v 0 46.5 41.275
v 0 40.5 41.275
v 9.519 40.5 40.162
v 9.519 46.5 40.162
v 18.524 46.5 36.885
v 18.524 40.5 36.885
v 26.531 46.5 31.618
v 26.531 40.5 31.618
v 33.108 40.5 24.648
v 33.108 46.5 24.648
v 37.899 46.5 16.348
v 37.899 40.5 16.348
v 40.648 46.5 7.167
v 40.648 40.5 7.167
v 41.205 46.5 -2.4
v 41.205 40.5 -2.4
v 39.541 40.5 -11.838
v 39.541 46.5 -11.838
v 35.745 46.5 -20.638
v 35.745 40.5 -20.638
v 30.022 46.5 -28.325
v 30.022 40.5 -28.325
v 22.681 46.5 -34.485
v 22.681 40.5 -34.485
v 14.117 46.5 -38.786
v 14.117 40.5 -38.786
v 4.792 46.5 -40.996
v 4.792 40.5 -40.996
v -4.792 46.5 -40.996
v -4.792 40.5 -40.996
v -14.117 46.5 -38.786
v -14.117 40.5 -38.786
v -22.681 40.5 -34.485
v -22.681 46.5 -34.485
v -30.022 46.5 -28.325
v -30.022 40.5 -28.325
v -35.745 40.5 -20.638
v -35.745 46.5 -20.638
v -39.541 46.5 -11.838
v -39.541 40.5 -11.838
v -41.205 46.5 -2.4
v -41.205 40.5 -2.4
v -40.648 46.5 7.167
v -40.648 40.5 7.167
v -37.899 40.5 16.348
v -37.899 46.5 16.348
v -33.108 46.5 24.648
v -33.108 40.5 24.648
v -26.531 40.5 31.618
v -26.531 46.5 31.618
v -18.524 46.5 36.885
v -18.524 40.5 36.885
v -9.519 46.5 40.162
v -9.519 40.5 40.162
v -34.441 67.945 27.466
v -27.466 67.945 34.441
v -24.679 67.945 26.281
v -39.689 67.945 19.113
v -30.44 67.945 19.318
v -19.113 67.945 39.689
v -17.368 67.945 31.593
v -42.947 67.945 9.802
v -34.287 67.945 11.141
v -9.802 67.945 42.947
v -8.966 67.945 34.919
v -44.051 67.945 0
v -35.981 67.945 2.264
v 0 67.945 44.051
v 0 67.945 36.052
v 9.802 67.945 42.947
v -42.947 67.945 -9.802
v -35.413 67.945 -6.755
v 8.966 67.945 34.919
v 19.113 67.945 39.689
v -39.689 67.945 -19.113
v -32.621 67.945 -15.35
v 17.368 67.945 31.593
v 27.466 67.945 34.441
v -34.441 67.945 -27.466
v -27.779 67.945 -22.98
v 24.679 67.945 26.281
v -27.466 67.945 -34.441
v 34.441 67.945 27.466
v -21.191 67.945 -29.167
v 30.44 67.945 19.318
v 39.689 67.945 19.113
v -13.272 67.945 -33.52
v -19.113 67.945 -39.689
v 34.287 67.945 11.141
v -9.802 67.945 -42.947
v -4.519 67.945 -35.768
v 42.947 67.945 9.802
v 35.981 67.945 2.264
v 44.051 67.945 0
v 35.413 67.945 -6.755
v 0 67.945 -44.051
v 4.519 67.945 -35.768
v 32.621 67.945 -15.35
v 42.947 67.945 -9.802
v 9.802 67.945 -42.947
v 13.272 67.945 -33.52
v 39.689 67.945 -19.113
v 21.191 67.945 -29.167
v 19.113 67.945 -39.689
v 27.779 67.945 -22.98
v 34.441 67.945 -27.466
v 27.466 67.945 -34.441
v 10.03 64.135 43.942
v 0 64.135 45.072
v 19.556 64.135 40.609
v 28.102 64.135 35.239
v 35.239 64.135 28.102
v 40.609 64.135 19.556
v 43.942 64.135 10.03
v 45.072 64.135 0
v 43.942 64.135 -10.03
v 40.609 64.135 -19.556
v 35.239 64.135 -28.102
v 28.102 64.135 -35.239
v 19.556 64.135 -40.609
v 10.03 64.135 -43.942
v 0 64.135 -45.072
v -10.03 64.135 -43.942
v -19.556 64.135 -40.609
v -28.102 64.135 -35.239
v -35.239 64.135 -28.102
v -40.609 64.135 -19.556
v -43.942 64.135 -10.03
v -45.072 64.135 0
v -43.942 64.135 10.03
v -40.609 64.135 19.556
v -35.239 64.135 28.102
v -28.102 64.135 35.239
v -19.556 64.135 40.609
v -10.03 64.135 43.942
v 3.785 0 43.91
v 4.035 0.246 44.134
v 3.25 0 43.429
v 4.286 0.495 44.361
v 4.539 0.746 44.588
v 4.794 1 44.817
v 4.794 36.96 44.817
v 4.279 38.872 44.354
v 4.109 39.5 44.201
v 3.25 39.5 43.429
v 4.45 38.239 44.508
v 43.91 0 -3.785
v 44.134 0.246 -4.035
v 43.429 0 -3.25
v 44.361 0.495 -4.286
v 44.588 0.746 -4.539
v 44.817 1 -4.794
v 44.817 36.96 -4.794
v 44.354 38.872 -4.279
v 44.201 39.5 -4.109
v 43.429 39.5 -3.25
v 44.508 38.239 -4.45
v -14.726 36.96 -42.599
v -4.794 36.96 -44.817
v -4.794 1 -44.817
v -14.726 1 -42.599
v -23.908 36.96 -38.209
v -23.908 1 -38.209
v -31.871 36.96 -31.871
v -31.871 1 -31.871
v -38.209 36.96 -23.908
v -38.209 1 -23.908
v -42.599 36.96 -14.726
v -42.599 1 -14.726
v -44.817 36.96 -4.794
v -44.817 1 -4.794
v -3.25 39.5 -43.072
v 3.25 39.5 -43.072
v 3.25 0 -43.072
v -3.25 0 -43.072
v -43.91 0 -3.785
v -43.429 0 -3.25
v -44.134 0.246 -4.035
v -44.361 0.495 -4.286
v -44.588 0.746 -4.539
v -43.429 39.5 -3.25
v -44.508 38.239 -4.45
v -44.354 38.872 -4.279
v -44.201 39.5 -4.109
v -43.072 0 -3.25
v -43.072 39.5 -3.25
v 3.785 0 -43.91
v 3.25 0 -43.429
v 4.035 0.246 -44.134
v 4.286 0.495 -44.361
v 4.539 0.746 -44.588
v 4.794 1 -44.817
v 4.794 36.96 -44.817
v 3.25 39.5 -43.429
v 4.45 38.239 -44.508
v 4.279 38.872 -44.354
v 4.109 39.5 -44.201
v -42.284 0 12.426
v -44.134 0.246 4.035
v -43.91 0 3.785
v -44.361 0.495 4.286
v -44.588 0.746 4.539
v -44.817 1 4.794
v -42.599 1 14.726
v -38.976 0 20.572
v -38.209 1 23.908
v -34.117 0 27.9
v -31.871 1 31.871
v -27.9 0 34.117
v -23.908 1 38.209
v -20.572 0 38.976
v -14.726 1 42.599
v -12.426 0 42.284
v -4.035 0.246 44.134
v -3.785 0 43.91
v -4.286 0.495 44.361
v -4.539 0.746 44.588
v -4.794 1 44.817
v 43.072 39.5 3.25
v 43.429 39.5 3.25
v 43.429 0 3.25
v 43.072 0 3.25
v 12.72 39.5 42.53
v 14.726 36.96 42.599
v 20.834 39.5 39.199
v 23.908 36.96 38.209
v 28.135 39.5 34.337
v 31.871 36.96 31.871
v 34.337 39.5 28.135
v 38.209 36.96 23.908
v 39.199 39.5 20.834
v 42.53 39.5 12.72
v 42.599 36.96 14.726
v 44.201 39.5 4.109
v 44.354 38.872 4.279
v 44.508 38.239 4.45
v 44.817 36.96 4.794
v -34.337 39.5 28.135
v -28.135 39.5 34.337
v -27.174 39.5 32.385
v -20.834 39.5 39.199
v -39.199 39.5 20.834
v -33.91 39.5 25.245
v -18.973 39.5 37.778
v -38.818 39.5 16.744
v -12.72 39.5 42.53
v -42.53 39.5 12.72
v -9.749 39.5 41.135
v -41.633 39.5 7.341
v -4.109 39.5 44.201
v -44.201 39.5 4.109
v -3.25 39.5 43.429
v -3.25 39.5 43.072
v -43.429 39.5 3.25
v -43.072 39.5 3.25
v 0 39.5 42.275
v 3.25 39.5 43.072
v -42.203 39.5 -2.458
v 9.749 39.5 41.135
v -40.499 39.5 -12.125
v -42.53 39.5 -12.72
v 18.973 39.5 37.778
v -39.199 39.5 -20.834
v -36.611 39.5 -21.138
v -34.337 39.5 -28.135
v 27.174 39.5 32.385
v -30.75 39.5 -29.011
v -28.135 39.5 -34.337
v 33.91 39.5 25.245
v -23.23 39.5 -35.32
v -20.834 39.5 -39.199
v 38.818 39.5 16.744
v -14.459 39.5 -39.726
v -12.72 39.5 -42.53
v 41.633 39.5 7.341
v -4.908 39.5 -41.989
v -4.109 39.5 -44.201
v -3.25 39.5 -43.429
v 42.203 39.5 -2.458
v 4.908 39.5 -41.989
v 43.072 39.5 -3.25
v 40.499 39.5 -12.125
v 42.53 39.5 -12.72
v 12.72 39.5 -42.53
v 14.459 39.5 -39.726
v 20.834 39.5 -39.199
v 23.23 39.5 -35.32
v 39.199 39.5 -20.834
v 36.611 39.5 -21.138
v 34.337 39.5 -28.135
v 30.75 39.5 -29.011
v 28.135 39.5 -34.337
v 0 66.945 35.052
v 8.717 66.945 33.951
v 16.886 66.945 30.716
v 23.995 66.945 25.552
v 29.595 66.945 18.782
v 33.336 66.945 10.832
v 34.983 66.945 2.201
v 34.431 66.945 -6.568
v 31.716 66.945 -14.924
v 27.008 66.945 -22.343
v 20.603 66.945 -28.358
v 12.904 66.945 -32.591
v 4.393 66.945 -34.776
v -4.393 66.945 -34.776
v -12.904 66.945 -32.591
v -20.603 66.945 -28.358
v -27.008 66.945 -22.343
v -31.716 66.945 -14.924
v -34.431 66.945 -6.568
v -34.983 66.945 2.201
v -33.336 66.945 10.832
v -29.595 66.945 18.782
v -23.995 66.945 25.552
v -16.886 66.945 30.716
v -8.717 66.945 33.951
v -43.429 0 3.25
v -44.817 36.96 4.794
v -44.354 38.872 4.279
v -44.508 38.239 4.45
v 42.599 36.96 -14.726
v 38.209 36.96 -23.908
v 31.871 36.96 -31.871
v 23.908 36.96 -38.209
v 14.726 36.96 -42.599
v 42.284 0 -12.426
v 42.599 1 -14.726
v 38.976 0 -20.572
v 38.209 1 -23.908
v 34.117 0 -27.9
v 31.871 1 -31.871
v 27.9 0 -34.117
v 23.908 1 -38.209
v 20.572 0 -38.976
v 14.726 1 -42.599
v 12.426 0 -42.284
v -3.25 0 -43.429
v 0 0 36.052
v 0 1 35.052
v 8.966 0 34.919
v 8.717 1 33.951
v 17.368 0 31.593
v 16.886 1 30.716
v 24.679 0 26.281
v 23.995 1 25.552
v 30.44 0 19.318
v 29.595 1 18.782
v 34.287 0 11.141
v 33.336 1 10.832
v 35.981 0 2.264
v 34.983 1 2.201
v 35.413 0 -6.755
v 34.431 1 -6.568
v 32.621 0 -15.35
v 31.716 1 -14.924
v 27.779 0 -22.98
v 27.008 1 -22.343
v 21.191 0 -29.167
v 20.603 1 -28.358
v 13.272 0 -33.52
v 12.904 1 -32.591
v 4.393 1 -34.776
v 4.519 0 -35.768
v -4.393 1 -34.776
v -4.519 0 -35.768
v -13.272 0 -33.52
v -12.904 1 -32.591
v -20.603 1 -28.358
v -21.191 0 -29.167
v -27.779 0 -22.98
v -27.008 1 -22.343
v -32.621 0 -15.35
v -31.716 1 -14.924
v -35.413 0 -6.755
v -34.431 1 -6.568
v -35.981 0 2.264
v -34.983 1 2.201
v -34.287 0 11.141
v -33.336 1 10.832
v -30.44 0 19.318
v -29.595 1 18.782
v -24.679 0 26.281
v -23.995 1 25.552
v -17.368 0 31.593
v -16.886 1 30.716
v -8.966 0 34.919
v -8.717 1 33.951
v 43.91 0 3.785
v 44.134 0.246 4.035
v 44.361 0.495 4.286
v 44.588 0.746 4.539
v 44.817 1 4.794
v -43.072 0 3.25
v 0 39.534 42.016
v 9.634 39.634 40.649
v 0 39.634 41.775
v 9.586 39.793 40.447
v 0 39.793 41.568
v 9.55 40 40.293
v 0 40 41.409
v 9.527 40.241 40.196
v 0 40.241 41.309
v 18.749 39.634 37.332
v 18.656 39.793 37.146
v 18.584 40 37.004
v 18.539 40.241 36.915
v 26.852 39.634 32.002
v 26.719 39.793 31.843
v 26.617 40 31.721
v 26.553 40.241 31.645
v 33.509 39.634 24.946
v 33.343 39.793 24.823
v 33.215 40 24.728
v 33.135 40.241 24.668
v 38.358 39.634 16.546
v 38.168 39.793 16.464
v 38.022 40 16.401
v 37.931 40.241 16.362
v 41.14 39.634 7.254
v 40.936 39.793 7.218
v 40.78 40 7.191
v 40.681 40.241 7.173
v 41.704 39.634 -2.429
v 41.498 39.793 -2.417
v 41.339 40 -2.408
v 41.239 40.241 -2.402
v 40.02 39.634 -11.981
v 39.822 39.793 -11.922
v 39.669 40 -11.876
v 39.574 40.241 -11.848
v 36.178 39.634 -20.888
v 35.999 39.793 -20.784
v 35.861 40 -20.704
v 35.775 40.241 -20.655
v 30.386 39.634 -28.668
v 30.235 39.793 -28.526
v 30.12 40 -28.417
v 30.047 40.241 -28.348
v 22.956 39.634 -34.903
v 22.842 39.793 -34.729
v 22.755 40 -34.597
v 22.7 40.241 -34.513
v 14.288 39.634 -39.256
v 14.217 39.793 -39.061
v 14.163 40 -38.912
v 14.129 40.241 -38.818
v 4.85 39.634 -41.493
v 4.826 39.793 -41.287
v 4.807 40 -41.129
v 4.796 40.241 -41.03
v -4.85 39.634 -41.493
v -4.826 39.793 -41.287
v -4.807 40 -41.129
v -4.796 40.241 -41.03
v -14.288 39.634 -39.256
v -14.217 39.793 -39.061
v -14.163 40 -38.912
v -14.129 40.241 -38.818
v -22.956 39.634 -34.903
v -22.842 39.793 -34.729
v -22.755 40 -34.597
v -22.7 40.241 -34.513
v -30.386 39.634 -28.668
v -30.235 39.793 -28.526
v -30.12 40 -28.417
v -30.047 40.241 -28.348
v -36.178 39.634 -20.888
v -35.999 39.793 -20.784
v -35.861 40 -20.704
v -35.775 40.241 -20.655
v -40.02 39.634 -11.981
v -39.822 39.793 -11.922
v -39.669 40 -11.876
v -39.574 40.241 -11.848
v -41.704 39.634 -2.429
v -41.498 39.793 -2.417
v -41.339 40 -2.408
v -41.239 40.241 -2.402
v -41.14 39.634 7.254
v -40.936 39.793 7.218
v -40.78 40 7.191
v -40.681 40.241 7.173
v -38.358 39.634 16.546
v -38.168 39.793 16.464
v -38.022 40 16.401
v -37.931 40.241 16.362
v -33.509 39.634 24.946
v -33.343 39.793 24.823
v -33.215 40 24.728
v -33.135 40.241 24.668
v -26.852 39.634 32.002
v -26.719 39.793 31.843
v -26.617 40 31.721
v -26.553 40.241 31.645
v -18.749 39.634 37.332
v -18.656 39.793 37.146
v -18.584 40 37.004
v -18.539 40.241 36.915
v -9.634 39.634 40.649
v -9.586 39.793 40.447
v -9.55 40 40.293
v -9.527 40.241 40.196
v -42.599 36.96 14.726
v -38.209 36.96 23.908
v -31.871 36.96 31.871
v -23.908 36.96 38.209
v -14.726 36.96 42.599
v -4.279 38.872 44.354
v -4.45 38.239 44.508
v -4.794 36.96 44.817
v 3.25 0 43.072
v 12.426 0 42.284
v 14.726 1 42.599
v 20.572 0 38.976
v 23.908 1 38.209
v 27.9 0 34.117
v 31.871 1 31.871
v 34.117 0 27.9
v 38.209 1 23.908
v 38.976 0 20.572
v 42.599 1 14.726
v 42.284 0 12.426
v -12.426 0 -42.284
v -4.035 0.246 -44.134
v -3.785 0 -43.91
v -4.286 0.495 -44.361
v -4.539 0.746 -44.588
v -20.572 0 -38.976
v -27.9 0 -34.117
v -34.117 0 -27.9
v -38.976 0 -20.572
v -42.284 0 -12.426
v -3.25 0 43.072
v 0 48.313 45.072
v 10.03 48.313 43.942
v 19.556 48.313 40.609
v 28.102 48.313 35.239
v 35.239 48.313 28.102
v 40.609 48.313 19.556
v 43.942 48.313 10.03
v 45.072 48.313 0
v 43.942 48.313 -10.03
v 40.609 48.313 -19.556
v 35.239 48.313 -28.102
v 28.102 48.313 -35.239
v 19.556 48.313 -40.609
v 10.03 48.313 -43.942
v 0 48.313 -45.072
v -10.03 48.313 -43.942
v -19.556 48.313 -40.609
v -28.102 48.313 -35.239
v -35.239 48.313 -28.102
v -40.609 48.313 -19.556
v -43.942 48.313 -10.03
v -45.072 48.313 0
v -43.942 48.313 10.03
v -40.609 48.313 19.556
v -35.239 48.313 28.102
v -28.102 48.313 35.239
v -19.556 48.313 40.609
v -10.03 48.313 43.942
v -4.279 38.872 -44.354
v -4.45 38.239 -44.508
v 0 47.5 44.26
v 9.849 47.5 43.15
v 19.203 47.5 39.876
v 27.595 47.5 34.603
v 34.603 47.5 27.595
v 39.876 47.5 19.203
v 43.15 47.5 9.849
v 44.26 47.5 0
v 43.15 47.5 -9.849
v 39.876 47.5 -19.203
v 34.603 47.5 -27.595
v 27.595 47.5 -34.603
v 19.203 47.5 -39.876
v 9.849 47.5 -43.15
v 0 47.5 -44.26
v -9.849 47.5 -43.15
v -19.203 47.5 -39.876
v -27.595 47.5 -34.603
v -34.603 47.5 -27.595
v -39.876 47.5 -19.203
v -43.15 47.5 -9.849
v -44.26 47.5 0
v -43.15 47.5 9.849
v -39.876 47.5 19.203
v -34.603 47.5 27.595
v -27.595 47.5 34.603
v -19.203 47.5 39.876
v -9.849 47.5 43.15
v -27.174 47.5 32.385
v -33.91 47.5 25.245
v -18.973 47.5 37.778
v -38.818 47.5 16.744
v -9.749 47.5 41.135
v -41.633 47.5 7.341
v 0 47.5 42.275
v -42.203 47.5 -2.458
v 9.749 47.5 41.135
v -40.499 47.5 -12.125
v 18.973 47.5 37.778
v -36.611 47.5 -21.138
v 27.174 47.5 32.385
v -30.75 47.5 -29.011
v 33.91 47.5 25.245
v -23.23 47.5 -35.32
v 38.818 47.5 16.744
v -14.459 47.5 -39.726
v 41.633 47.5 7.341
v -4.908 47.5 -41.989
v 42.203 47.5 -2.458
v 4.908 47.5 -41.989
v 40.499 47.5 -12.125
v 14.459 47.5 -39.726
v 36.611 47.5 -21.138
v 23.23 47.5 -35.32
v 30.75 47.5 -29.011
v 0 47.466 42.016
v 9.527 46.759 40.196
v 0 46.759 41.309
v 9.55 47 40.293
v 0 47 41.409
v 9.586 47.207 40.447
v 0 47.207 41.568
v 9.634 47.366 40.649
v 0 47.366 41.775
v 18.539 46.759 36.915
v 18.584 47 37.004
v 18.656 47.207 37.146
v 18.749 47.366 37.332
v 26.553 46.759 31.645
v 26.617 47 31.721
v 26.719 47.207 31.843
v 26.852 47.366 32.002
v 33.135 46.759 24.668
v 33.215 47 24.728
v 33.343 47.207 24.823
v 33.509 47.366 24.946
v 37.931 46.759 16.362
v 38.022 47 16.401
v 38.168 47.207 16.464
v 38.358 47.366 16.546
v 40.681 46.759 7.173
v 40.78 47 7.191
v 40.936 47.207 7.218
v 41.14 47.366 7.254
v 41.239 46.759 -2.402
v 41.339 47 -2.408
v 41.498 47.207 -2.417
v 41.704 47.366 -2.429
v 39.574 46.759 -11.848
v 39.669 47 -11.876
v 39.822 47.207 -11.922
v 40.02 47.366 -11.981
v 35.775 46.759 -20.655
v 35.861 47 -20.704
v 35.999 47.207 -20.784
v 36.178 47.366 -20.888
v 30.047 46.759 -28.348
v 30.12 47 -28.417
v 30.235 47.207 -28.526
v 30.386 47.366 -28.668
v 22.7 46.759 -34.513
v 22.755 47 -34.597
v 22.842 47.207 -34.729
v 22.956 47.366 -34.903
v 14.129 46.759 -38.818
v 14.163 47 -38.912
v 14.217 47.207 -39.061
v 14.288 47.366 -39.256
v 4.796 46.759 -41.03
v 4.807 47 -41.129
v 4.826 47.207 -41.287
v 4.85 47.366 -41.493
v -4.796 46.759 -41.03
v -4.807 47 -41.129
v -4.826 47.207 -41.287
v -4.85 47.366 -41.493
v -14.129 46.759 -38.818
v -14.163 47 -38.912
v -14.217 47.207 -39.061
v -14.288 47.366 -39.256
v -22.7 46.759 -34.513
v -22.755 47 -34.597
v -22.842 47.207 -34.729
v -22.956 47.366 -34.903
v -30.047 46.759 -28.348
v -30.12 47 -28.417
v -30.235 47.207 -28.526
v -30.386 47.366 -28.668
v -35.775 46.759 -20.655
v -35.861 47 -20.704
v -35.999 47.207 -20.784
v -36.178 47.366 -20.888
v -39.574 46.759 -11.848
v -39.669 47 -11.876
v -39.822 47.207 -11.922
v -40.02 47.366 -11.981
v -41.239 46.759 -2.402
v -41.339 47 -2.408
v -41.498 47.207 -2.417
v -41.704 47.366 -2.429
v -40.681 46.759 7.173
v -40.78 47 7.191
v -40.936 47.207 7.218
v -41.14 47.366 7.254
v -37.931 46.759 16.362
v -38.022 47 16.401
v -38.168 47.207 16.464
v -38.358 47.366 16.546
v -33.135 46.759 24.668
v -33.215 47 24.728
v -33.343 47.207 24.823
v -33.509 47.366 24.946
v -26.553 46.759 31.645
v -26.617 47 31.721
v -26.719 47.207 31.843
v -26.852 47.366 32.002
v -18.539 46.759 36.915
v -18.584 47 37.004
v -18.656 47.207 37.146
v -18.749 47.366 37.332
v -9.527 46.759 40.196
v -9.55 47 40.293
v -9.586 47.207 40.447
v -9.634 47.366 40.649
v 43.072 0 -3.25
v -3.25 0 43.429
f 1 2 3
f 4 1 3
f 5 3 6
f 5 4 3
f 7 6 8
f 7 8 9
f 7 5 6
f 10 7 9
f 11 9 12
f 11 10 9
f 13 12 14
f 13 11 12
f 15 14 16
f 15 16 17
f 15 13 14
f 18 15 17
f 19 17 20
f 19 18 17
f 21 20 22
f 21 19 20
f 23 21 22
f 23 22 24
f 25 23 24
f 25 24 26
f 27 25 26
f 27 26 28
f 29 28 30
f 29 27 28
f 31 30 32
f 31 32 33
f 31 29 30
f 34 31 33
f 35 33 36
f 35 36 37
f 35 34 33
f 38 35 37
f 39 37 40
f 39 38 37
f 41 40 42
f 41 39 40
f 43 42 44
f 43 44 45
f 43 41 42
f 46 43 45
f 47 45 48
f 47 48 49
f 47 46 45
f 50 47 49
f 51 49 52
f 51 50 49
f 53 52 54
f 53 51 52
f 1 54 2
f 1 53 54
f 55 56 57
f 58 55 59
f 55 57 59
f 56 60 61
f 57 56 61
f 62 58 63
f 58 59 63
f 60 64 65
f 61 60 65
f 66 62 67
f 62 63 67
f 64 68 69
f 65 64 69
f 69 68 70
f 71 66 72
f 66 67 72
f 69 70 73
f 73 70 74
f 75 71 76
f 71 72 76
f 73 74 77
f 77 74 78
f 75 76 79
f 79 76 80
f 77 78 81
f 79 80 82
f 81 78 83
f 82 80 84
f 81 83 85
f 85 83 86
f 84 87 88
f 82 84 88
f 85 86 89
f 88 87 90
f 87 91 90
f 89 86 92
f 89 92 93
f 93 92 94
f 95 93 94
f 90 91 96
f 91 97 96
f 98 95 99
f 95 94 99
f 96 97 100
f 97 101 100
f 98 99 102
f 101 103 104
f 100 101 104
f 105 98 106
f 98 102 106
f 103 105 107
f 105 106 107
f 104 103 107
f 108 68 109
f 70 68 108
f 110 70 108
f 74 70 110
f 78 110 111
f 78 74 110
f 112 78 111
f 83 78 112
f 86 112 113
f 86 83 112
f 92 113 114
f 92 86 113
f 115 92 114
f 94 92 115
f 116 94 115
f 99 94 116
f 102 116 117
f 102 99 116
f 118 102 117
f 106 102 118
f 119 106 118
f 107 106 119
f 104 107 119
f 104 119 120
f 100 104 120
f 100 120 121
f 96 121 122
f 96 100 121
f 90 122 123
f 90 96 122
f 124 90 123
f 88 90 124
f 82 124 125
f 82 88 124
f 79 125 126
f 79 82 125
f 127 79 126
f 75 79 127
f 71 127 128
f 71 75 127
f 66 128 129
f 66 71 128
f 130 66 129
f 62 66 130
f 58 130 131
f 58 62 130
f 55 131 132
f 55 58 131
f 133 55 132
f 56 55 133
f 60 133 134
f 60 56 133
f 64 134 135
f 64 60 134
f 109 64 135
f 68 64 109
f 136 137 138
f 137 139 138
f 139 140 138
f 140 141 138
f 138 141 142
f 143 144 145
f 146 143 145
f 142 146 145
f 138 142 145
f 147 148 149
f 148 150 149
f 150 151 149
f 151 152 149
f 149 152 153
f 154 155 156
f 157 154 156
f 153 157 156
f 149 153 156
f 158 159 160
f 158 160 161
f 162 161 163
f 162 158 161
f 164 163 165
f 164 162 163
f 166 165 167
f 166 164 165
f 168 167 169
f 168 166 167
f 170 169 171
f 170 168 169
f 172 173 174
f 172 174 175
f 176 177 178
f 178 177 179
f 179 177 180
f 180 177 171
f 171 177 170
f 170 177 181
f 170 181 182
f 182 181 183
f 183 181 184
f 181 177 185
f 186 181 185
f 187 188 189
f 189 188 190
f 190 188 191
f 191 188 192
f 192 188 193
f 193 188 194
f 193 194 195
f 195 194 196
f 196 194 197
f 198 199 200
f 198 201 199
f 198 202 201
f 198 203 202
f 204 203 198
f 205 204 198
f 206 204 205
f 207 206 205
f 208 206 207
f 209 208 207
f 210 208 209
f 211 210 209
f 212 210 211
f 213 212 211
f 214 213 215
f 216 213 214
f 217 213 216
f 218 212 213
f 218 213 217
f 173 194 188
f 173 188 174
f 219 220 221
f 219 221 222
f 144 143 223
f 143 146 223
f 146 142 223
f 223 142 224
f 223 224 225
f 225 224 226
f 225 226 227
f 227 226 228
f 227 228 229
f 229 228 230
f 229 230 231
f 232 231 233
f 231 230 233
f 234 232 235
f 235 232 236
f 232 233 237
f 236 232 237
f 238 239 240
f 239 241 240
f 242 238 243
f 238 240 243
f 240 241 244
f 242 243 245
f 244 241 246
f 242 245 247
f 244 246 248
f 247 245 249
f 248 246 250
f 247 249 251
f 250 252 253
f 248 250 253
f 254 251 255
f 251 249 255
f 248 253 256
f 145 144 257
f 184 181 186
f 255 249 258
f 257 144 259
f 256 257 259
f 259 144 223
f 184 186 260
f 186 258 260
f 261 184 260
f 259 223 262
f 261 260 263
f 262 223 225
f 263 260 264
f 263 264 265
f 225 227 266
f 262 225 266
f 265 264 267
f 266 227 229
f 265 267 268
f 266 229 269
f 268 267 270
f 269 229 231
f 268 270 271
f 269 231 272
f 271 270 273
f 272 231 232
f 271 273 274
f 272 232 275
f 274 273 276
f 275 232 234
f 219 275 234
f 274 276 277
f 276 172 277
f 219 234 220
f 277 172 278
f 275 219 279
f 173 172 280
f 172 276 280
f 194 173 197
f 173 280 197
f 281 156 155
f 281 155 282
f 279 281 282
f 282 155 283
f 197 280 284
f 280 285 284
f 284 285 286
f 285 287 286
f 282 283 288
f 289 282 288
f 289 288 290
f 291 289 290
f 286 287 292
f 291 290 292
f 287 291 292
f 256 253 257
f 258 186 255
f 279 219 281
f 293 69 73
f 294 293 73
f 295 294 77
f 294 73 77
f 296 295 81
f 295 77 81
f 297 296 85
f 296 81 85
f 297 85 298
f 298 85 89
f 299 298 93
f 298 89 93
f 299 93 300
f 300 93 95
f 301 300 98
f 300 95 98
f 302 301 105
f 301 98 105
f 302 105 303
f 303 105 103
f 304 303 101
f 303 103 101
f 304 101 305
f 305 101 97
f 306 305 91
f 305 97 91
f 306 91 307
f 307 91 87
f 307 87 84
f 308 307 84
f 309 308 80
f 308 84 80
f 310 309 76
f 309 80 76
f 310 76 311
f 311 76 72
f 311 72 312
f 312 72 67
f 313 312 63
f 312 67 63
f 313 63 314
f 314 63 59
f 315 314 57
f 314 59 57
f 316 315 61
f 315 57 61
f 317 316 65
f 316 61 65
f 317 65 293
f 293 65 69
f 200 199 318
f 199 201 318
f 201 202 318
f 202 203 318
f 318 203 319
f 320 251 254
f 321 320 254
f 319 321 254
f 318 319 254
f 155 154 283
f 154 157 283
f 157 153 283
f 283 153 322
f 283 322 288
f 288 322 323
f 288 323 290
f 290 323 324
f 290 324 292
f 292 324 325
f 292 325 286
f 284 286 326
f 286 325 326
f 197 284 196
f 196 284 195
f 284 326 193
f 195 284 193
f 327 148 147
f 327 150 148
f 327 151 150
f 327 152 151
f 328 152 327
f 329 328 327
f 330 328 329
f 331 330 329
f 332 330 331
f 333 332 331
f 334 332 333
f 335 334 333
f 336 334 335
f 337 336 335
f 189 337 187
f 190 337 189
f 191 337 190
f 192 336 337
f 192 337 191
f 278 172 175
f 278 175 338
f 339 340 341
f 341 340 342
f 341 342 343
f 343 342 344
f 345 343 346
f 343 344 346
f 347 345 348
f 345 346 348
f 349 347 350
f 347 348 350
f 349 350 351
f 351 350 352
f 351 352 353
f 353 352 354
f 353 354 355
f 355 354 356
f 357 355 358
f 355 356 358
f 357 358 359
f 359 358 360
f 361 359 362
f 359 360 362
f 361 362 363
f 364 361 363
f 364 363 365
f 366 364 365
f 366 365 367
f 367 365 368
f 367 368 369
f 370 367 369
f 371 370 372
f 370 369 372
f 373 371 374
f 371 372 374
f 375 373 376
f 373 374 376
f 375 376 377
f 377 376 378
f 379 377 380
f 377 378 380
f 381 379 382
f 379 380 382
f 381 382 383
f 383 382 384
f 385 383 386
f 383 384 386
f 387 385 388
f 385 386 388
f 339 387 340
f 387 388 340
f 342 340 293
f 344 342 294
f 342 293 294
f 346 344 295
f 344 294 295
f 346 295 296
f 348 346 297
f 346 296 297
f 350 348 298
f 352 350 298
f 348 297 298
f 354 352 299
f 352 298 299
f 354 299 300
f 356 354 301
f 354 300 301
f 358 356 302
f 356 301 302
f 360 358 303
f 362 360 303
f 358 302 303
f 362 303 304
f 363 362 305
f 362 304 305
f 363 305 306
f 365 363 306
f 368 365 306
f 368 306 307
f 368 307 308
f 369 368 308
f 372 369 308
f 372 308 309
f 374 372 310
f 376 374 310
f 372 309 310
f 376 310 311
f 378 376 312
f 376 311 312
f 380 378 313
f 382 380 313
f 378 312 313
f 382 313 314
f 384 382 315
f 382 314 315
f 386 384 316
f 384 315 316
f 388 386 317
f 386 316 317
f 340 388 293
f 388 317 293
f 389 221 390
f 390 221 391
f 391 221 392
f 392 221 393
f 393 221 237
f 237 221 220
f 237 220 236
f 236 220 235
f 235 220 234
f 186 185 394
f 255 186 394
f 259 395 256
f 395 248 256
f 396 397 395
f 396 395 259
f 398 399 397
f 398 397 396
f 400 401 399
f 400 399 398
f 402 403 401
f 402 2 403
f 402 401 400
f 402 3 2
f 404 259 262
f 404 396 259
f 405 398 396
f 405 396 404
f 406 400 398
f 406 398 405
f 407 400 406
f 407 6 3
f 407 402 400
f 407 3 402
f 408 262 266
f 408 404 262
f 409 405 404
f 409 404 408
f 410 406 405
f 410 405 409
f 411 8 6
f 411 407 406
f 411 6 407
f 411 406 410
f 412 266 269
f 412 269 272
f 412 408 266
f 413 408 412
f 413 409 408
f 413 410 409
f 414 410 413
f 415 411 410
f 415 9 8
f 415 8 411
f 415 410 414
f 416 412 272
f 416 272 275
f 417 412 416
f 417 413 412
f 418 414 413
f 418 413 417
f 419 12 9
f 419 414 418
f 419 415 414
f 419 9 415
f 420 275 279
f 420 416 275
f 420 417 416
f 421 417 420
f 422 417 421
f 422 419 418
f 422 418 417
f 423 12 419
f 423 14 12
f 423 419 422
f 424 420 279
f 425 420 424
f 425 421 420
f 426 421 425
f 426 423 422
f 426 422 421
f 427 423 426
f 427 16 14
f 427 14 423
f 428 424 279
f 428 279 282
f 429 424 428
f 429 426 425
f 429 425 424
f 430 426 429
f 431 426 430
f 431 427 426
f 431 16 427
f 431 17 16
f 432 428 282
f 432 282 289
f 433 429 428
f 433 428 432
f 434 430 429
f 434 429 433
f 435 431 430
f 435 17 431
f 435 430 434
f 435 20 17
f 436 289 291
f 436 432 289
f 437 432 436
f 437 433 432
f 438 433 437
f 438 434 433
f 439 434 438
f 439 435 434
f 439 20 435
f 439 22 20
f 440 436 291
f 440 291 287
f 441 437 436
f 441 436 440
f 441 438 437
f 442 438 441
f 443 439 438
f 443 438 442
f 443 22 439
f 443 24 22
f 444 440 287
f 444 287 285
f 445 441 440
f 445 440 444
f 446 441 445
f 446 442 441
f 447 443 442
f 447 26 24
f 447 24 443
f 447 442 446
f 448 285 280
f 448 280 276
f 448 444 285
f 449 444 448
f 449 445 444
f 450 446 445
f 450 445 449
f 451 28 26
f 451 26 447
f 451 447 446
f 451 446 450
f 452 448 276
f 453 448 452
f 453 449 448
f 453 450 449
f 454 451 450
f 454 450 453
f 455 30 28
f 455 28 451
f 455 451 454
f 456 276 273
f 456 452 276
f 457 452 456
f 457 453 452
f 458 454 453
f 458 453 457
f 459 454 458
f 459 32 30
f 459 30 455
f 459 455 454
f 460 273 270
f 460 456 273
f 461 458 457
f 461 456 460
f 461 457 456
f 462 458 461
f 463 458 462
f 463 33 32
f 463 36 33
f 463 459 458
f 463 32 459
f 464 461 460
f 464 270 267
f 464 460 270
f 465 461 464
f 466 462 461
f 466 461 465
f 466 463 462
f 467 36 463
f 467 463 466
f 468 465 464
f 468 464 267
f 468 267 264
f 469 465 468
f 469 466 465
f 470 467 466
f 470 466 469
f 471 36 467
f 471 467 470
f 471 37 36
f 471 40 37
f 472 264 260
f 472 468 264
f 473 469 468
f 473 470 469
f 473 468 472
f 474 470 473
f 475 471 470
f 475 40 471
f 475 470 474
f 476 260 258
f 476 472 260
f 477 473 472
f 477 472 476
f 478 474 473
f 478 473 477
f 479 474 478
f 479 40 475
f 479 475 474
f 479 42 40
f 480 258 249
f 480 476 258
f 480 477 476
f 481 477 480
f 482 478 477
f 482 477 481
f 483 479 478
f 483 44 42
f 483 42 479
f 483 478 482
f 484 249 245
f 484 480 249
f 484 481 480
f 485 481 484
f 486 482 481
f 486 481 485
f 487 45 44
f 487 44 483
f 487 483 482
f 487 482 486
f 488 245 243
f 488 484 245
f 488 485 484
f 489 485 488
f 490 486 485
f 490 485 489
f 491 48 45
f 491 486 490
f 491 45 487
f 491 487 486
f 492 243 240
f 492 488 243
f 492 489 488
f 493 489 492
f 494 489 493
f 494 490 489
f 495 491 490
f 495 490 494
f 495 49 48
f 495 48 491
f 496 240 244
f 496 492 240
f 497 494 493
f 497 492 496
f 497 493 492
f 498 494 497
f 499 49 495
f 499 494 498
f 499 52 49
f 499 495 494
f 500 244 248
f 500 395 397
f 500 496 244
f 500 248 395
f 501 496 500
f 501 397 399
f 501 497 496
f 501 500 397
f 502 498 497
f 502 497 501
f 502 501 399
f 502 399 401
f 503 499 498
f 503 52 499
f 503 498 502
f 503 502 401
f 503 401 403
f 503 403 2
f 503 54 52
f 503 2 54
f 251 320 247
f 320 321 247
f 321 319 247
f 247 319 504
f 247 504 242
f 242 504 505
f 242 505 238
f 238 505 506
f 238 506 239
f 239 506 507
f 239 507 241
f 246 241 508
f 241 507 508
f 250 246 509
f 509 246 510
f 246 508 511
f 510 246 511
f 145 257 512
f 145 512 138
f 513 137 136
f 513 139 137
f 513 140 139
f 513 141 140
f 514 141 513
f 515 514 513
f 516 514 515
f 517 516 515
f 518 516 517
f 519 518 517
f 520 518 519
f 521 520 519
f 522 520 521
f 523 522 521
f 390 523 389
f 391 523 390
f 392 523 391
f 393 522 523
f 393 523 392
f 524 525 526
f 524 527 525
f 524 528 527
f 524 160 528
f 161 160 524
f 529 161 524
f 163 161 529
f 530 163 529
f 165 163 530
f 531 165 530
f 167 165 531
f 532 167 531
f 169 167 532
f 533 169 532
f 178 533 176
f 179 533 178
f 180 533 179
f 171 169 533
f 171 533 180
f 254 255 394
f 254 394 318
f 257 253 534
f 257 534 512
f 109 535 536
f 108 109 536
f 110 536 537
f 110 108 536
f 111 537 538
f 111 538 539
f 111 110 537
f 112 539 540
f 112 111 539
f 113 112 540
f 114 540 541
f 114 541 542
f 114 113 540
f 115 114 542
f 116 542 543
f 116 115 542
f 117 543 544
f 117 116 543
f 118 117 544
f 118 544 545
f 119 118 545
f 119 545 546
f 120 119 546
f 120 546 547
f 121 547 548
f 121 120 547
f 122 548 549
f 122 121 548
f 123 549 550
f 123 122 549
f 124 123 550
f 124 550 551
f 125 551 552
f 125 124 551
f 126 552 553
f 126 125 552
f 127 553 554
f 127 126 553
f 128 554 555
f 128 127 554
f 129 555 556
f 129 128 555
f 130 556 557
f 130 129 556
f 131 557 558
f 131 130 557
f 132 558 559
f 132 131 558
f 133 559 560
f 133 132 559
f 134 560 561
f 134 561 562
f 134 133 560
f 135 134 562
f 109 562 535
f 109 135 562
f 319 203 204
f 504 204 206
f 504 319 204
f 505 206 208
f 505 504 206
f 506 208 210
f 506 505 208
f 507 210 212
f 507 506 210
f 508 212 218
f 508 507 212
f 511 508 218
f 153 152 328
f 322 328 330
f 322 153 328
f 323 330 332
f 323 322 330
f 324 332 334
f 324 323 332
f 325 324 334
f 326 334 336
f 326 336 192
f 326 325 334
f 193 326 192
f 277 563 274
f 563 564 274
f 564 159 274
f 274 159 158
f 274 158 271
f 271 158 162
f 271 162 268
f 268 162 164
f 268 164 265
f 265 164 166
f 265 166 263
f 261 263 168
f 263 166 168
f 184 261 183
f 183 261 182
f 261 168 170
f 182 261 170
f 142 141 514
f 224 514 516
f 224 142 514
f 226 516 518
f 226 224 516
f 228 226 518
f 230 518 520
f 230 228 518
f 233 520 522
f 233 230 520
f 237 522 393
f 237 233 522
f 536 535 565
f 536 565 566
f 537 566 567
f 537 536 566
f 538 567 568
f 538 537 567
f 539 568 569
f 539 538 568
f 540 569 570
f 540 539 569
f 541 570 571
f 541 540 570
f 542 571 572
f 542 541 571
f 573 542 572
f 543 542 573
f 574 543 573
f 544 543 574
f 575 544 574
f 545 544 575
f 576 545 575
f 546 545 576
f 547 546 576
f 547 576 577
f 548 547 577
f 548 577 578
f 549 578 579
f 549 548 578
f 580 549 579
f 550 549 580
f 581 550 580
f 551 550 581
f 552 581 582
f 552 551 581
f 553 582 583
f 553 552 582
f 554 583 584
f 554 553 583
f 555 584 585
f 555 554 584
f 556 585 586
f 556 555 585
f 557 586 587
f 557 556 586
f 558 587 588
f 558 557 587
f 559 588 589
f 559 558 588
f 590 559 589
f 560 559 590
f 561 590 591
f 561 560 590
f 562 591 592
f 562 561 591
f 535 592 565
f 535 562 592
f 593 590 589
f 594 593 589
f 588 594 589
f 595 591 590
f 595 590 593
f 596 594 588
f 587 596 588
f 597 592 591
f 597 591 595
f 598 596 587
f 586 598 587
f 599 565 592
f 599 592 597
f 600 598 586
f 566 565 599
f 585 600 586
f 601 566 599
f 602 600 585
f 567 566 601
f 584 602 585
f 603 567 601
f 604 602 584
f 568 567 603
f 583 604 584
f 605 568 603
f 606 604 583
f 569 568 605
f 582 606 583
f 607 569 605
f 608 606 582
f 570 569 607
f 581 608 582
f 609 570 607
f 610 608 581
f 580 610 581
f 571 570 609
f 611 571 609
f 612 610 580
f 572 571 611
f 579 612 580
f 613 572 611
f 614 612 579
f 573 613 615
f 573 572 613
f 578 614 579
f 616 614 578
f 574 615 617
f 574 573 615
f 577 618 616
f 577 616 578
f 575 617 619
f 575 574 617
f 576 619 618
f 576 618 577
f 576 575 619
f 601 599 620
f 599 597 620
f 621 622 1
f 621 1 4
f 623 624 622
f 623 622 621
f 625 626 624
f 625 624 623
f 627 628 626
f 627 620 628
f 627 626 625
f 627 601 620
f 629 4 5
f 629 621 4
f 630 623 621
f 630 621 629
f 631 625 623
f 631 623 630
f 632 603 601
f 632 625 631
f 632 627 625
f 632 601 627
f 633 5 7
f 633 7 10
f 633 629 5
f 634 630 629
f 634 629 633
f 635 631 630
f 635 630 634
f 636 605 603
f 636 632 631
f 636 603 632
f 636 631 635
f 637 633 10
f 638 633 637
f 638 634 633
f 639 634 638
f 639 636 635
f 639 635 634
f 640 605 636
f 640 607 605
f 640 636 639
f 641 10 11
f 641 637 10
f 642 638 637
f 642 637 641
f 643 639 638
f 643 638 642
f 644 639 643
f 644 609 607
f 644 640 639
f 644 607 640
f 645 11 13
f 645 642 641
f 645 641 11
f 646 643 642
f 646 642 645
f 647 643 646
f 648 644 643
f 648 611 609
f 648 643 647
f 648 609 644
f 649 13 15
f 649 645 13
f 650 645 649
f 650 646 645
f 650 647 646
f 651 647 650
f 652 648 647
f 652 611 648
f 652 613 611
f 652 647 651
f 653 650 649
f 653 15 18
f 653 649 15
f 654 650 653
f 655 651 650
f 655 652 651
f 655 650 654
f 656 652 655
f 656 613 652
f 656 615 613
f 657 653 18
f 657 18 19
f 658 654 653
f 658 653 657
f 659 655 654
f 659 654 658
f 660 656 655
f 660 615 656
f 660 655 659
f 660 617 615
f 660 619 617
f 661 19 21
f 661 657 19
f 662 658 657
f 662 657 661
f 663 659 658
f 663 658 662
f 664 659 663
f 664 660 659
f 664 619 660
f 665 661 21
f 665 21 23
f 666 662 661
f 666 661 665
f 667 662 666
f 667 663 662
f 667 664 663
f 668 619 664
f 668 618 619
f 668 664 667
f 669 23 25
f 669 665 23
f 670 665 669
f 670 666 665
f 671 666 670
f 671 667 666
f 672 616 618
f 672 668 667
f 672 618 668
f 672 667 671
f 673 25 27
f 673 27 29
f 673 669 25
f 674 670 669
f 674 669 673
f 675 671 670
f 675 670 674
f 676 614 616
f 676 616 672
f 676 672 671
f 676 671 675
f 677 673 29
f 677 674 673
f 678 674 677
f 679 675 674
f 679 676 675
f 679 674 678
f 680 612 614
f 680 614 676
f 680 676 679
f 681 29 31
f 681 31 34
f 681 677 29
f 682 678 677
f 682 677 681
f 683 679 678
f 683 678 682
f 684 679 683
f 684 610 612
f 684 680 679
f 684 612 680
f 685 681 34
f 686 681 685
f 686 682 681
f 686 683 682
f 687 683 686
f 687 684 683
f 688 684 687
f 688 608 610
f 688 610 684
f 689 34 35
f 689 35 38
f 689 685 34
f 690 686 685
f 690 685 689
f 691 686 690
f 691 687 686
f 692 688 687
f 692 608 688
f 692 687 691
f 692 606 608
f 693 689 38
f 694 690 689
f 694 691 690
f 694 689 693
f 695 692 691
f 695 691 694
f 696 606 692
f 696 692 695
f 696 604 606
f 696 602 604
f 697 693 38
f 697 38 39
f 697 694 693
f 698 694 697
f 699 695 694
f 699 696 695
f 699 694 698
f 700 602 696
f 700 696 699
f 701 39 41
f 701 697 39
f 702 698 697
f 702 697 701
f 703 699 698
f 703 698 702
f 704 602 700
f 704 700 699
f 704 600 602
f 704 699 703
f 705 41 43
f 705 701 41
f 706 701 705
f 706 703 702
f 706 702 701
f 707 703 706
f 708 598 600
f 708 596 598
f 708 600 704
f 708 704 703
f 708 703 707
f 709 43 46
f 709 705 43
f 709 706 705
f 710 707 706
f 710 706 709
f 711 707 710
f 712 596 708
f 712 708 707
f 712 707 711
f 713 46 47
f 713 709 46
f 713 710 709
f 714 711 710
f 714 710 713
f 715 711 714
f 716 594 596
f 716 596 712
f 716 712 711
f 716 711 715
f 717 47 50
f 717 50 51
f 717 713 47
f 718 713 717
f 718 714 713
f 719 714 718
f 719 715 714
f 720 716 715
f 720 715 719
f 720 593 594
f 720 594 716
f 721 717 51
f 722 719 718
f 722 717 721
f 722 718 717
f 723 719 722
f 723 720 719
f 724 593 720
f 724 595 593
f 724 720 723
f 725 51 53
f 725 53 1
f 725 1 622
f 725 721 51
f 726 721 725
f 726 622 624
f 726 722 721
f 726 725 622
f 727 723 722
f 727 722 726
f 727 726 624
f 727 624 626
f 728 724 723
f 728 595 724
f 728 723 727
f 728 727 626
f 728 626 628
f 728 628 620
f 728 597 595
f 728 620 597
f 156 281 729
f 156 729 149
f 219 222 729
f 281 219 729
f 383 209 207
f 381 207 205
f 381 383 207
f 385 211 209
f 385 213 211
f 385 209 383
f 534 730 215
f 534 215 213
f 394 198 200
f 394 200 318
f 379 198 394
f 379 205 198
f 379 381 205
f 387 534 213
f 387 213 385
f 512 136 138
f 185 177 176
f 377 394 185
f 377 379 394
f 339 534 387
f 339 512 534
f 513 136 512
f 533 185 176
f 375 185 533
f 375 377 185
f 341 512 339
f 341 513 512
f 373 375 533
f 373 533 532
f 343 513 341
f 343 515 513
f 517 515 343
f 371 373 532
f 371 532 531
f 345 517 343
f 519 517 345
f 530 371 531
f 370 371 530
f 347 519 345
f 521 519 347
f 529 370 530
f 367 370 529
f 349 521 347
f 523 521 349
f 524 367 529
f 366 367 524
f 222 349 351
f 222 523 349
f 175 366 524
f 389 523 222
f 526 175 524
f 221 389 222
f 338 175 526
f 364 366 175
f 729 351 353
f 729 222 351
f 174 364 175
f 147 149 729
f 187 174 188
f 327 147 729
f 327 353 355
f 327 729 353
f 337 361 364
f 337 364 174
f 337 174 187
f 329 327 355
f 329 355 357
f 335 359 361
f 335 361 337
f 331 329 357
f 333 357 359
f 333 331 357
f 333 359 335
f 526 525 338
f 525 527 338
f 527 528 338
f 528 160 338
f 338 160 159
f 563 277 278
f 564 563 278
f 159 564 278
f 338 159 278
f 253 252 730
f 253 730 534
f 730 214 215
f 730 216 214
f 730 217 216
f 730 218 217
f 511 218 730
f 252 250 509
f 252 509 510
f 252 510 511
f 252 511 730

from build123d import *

# Parameters (mm, degrees)
F0_W            = 67.945
F0_H            = 10.0203
F2_SIZE         = 1
F3_SIZE2        = 1.0208864232
F3_SIZE         = 3.81
F4_W            = 8
F4_H            = 9.8567151233
F7_DEPTH        = 40
F7_COPIES_COUNT = 4
F8_T1_DEPTH     = 46.4577782779
F9_R            = 1
F10_SIZE        = 0.8128
F11_SIZE2       = 2.54
F11_SIZE        = 0.6805909488


# Not quite as in the source:
# - a fillet or chamfer that OpenCascade refuses, or shapes differently, is made with other operations: its cross-section is extruded or revolved along the edge and cut away or added
# - a pattern or mirror of a feature is missing from the dataset's text; its kind, count and spacing are read off the source's solid


with BuildPart() as f1:
    # F0 (on Right) → F1 (revolve)
    with BuildSketch(Plane.YZ):
        with Locations((33.9725, 40.06215)):
            Rectangle(F0_W, F0_H)
    revolve(axis=Axis((0, 10.0695292601, 0), (0, 1, 0)))

    # F2
    f2_edges = [f1.edges().sort_by_distance(p)[0] for p in [
        (0, 0, -35.052),
        (0, 0, -45.0723),
        (0, 67.945, -35.052),
    ]]
    chamfer(f2_edges, length=F2_SIZE)

    # F3
    f3_edges = [f1.edges().sort_by_distance(p)[0] for p in [
        (0, 67.945, -45.0723),
    ]]
    chamfer(f3_edges, length=F3_SIZE, length2=F3_SIZE2)

    # F4 (on Right) → F5 (revolve, cut)
    with BuildSketch(Plane.YZ):
        with Locations((43.5, 46.2033575617)):
            Rectangle(F4_W, F4_H)
    revolve(axis=Axis((0, 33.4974332383, 0), (0, 1, 0)), mode=Mode.SUBTRACT)

    # F6 (on face) → F7 (cut)
    with BuildSketch(Plane.XZ):
        Polygon((3.25, 49.6761292126), (0, 49.6761292126), (-3.25, 49.6761292126), (-3.25, 43.0723), (0, 43.0723), (3.25, 43.0723), align=None)
    f7 = extrude(amount=-F7_DEPTH, mode=Mode.SUBTRACT)

    # F7_copies: F7 ×4 about axis
    f7_copies_axis = Axis((0, 0, 0), (0, 1, 0))
    for i in range(1, F7_COPIES_COUNT):
        add(f7.rotate(f7_copies_axis, i * 360 / F7_COPIES_COUNT), mode=Mode.SUBTRACT)

    # F8: chamfer of 1.5 on 8 edges, made by hand

    # F8_s2 → F8_t1 (cut)
    with BuildSketch(Plane.XZ.offset(-43.478889139)):
        with BuildLine():
            Line((-4.8385212577, 44.8567419714), (-3.2053743546, 43.3889711075))
            Line((-3.2053743546, 43.3889711075), (-3.1753743546, 43.3889711075))
            ThreePointArc((-3.1753743546, 43.3889711075), (-3.22, 44.1719727759), (-3.22, 44.9549744443))
            Line((-3.22, 44.9549744443), (-3.2521631911, 44.9848963528))
            ThreePointArc((-3.2521631911, 44.9848963528), (-4.0455787179, 44.9204937431), (-4.8417120615, 44.8865718016))
            Line((-4.8417120615, 44.8865718016), (-4.8385212577, 44.8567419714))
        make_face()
        with BuildLine():
            Line((4.8385212577, 44.8567419714), (3.2053743546, 43.3889711075))
            Line((3.2053743546, 43.3889711075), (3.1753743546, 43.3889711075))
            ThreePointArc((3.1753743546, 43.3889711075), (3.22, 44.1719727759), (3.22, 44.9549744443))
            Line((3.22, 44.9549744443), (3.2521631911, 44.9848963528))
            ThreePointArc((3.2521631911, 44.9848963528), (4.0455787179, 44.9204937431), (4.8417120615, 44.8865718016))
            Line((4.8417120615, 44.8865718016), (4.8385212577, 44.8567419714))
        make_face()
        with BuildLine():
            Line((-44.8567419714, 4.8385212577), (-43.3889711075, 3.2053743546))
            Line((-43.3889711075, 3.2053743546), (-43.3889711075, 3.1753743546))
            ThreePointArc((-43.3889711075, 3.1753743546), (-44.1719727759, 3.22), (-44.9549744443, 3.22))
            Line((-44.9549744443, 3.22), (-44.9848963528, 3.2521631911))
            ThreePointArc((-44.9848963528, 3.2521631911), (-44.9204937431, 4.0455787179), (-44.8865718016, 4.8417120615))
            Line((-44.8865718016, 4.8417120615), (-44.8567419714, 4.8385212577))
        make_face()
        with BuildLine():
            Line((-43.3889711075, -3.2053743546), (-44.8567419714, -4.8385212577))
            Line((-44.8567419714, -4.8385212577), (-44.8865718016, -4.8417120615))
            ThreePointArc((-44.8865718016, -4.8417120615), (-44.9204937431, -4.0455787179), (-44.9848963528, -3.2521631911))
            Line((-44.9848963528, -3.2521631911), (-44.9549744443, -3.22))
            ThreePointArc((-44.9549744443, -3.22), (-44.1719727759, -3.22), (-43.3889711075, -3.1753743546))
            Line((-43.3889711075, -3.1753743546), (-43.3889711075, -3.2053743546))
        make_face()
        with BuildLine():
            Line((-4.8385212577, -44.8567419714), (-3.2053743546, -43.3889711075))
            Line((-3.2053743546, -43.3889711075), (-3.1753743546, -43.3889711075))
            ThreePointArc((-3.1753743546, -43.3889711075), (-3.22, -44.1719727759), (-3.22, -44.9549744443))
            Line((-3.22, -44.9549744443), (-3.2521631911, -44.9848963528))
            ThreePointArc((-3.2521631911, -44.9848963528), (-4.0455787179, -44.9204937431), (-4.8417120615, -44.8865718016))
            Line((-4.8417120615, -44.8865718016), (-4.8385212577, -44.8567419714))
        make_face()
        with BuildLine():
            Line((3.2053743546, -43.3889711075), (4.8385212577, -44.8567419714))
            Line((4.8385212577, -44.8567419714), (4.8417120615, -44.8865718016))
            ThreePointArc((4.8417120615, -44.8865718016), (4.0455787179, -44.9204937431), (3.2521631911, -44.9848963528))
            Line((3.2521631911, -44.9848963528), (3.22, -44.9549744443))
            ThreePointArc((3.22, -44.9549744443), (3.22, -44.1719727759), (3.1753743546, -43.3889711075))
            Line((3.1753743546, -43.3889711075), (3.2053743546, -43.3889711075))
        make_face()
        with BuildLine():
            Line((44.8567419714, -4.8385212577), (43.3889711075, -3.2053743546))
            Line((43.3889711075, -3.2053743546), (43.3889711075, -3.1753743546))
            ThreePointArc((43.3889711075, -3.1753743546), (44.1719727759, -3.22), (44.9549744443, -3.22))
            Line((44.9549744443, -3.22), (44.9848963528, -3.2521631911))
            ThreePointArc((44.9848963528, -3.2521631911), (44.9204937431, -4.0455787179), (44.8865718016, -4.8417120615))
            Line((44.8865718016, -4.8417120615), (44.8567419714, -4.8385212577))
        make_face()
        with BuildLine():
            Line((43.3889711075, 3.2053743546), (44.8567419714, 4.8385212577))
            Line((44.8567419714, 4.8385212577), (44.8865718016, 4.8417120615))
            ThreePointArc((44.8865718016, 4.8417120615), (44.9204937431, 4.0455787179), (44.9848963528, 3.2521631911))
            Line((44.9848963528, 3.2521631911), (44.9549744443, 3.22))
            ThreePointArc((44.9549744443, 3.22), (44.1719727759, 3.22), (43.3889711075, 3.1753743546))
            Line((43.3889711075, 3.1753743546), (43.3889711075, 3.2053743546))
        make_face()
    extrude(amount=F8_T1_DEPTH, mode=Mode.SUBTRACT)

    # F9
    f9_edges = [f1.edges().sort_by_distance(p)[0] for p in [
        (0, 39.5, -41.275),
        (0, 47.5, -41.275),
    ]]
    fillet(f9_edges, radius=F9_R)

    # F10
    f10_edges = [f1.edges().sort_by_distance(p)[0] for p in [
        (0, 47.5, -45.0723),
    ]]
    chamfer(f10_edges, length=F10_SIZE)

    # F11
    f11_edges = [f1.edges().sort_by_distance(p)[0] for p in [
        (-31.870929, 39.5, 31.870929),
        (-31.870929, 39.5, -31.870929),
        (31.870929, 39.5, -31.870929),
        (31.870929, 39.5, 31.870929),
    ]]
    f11_side = f1.faces().sort_by_distance((0, 39.5, -42.401761))[0]
    chamfer(f11_edges, length=F11_SIZE, length2=F11_SIZE2, reference=f11_side)


solid = f1.part
